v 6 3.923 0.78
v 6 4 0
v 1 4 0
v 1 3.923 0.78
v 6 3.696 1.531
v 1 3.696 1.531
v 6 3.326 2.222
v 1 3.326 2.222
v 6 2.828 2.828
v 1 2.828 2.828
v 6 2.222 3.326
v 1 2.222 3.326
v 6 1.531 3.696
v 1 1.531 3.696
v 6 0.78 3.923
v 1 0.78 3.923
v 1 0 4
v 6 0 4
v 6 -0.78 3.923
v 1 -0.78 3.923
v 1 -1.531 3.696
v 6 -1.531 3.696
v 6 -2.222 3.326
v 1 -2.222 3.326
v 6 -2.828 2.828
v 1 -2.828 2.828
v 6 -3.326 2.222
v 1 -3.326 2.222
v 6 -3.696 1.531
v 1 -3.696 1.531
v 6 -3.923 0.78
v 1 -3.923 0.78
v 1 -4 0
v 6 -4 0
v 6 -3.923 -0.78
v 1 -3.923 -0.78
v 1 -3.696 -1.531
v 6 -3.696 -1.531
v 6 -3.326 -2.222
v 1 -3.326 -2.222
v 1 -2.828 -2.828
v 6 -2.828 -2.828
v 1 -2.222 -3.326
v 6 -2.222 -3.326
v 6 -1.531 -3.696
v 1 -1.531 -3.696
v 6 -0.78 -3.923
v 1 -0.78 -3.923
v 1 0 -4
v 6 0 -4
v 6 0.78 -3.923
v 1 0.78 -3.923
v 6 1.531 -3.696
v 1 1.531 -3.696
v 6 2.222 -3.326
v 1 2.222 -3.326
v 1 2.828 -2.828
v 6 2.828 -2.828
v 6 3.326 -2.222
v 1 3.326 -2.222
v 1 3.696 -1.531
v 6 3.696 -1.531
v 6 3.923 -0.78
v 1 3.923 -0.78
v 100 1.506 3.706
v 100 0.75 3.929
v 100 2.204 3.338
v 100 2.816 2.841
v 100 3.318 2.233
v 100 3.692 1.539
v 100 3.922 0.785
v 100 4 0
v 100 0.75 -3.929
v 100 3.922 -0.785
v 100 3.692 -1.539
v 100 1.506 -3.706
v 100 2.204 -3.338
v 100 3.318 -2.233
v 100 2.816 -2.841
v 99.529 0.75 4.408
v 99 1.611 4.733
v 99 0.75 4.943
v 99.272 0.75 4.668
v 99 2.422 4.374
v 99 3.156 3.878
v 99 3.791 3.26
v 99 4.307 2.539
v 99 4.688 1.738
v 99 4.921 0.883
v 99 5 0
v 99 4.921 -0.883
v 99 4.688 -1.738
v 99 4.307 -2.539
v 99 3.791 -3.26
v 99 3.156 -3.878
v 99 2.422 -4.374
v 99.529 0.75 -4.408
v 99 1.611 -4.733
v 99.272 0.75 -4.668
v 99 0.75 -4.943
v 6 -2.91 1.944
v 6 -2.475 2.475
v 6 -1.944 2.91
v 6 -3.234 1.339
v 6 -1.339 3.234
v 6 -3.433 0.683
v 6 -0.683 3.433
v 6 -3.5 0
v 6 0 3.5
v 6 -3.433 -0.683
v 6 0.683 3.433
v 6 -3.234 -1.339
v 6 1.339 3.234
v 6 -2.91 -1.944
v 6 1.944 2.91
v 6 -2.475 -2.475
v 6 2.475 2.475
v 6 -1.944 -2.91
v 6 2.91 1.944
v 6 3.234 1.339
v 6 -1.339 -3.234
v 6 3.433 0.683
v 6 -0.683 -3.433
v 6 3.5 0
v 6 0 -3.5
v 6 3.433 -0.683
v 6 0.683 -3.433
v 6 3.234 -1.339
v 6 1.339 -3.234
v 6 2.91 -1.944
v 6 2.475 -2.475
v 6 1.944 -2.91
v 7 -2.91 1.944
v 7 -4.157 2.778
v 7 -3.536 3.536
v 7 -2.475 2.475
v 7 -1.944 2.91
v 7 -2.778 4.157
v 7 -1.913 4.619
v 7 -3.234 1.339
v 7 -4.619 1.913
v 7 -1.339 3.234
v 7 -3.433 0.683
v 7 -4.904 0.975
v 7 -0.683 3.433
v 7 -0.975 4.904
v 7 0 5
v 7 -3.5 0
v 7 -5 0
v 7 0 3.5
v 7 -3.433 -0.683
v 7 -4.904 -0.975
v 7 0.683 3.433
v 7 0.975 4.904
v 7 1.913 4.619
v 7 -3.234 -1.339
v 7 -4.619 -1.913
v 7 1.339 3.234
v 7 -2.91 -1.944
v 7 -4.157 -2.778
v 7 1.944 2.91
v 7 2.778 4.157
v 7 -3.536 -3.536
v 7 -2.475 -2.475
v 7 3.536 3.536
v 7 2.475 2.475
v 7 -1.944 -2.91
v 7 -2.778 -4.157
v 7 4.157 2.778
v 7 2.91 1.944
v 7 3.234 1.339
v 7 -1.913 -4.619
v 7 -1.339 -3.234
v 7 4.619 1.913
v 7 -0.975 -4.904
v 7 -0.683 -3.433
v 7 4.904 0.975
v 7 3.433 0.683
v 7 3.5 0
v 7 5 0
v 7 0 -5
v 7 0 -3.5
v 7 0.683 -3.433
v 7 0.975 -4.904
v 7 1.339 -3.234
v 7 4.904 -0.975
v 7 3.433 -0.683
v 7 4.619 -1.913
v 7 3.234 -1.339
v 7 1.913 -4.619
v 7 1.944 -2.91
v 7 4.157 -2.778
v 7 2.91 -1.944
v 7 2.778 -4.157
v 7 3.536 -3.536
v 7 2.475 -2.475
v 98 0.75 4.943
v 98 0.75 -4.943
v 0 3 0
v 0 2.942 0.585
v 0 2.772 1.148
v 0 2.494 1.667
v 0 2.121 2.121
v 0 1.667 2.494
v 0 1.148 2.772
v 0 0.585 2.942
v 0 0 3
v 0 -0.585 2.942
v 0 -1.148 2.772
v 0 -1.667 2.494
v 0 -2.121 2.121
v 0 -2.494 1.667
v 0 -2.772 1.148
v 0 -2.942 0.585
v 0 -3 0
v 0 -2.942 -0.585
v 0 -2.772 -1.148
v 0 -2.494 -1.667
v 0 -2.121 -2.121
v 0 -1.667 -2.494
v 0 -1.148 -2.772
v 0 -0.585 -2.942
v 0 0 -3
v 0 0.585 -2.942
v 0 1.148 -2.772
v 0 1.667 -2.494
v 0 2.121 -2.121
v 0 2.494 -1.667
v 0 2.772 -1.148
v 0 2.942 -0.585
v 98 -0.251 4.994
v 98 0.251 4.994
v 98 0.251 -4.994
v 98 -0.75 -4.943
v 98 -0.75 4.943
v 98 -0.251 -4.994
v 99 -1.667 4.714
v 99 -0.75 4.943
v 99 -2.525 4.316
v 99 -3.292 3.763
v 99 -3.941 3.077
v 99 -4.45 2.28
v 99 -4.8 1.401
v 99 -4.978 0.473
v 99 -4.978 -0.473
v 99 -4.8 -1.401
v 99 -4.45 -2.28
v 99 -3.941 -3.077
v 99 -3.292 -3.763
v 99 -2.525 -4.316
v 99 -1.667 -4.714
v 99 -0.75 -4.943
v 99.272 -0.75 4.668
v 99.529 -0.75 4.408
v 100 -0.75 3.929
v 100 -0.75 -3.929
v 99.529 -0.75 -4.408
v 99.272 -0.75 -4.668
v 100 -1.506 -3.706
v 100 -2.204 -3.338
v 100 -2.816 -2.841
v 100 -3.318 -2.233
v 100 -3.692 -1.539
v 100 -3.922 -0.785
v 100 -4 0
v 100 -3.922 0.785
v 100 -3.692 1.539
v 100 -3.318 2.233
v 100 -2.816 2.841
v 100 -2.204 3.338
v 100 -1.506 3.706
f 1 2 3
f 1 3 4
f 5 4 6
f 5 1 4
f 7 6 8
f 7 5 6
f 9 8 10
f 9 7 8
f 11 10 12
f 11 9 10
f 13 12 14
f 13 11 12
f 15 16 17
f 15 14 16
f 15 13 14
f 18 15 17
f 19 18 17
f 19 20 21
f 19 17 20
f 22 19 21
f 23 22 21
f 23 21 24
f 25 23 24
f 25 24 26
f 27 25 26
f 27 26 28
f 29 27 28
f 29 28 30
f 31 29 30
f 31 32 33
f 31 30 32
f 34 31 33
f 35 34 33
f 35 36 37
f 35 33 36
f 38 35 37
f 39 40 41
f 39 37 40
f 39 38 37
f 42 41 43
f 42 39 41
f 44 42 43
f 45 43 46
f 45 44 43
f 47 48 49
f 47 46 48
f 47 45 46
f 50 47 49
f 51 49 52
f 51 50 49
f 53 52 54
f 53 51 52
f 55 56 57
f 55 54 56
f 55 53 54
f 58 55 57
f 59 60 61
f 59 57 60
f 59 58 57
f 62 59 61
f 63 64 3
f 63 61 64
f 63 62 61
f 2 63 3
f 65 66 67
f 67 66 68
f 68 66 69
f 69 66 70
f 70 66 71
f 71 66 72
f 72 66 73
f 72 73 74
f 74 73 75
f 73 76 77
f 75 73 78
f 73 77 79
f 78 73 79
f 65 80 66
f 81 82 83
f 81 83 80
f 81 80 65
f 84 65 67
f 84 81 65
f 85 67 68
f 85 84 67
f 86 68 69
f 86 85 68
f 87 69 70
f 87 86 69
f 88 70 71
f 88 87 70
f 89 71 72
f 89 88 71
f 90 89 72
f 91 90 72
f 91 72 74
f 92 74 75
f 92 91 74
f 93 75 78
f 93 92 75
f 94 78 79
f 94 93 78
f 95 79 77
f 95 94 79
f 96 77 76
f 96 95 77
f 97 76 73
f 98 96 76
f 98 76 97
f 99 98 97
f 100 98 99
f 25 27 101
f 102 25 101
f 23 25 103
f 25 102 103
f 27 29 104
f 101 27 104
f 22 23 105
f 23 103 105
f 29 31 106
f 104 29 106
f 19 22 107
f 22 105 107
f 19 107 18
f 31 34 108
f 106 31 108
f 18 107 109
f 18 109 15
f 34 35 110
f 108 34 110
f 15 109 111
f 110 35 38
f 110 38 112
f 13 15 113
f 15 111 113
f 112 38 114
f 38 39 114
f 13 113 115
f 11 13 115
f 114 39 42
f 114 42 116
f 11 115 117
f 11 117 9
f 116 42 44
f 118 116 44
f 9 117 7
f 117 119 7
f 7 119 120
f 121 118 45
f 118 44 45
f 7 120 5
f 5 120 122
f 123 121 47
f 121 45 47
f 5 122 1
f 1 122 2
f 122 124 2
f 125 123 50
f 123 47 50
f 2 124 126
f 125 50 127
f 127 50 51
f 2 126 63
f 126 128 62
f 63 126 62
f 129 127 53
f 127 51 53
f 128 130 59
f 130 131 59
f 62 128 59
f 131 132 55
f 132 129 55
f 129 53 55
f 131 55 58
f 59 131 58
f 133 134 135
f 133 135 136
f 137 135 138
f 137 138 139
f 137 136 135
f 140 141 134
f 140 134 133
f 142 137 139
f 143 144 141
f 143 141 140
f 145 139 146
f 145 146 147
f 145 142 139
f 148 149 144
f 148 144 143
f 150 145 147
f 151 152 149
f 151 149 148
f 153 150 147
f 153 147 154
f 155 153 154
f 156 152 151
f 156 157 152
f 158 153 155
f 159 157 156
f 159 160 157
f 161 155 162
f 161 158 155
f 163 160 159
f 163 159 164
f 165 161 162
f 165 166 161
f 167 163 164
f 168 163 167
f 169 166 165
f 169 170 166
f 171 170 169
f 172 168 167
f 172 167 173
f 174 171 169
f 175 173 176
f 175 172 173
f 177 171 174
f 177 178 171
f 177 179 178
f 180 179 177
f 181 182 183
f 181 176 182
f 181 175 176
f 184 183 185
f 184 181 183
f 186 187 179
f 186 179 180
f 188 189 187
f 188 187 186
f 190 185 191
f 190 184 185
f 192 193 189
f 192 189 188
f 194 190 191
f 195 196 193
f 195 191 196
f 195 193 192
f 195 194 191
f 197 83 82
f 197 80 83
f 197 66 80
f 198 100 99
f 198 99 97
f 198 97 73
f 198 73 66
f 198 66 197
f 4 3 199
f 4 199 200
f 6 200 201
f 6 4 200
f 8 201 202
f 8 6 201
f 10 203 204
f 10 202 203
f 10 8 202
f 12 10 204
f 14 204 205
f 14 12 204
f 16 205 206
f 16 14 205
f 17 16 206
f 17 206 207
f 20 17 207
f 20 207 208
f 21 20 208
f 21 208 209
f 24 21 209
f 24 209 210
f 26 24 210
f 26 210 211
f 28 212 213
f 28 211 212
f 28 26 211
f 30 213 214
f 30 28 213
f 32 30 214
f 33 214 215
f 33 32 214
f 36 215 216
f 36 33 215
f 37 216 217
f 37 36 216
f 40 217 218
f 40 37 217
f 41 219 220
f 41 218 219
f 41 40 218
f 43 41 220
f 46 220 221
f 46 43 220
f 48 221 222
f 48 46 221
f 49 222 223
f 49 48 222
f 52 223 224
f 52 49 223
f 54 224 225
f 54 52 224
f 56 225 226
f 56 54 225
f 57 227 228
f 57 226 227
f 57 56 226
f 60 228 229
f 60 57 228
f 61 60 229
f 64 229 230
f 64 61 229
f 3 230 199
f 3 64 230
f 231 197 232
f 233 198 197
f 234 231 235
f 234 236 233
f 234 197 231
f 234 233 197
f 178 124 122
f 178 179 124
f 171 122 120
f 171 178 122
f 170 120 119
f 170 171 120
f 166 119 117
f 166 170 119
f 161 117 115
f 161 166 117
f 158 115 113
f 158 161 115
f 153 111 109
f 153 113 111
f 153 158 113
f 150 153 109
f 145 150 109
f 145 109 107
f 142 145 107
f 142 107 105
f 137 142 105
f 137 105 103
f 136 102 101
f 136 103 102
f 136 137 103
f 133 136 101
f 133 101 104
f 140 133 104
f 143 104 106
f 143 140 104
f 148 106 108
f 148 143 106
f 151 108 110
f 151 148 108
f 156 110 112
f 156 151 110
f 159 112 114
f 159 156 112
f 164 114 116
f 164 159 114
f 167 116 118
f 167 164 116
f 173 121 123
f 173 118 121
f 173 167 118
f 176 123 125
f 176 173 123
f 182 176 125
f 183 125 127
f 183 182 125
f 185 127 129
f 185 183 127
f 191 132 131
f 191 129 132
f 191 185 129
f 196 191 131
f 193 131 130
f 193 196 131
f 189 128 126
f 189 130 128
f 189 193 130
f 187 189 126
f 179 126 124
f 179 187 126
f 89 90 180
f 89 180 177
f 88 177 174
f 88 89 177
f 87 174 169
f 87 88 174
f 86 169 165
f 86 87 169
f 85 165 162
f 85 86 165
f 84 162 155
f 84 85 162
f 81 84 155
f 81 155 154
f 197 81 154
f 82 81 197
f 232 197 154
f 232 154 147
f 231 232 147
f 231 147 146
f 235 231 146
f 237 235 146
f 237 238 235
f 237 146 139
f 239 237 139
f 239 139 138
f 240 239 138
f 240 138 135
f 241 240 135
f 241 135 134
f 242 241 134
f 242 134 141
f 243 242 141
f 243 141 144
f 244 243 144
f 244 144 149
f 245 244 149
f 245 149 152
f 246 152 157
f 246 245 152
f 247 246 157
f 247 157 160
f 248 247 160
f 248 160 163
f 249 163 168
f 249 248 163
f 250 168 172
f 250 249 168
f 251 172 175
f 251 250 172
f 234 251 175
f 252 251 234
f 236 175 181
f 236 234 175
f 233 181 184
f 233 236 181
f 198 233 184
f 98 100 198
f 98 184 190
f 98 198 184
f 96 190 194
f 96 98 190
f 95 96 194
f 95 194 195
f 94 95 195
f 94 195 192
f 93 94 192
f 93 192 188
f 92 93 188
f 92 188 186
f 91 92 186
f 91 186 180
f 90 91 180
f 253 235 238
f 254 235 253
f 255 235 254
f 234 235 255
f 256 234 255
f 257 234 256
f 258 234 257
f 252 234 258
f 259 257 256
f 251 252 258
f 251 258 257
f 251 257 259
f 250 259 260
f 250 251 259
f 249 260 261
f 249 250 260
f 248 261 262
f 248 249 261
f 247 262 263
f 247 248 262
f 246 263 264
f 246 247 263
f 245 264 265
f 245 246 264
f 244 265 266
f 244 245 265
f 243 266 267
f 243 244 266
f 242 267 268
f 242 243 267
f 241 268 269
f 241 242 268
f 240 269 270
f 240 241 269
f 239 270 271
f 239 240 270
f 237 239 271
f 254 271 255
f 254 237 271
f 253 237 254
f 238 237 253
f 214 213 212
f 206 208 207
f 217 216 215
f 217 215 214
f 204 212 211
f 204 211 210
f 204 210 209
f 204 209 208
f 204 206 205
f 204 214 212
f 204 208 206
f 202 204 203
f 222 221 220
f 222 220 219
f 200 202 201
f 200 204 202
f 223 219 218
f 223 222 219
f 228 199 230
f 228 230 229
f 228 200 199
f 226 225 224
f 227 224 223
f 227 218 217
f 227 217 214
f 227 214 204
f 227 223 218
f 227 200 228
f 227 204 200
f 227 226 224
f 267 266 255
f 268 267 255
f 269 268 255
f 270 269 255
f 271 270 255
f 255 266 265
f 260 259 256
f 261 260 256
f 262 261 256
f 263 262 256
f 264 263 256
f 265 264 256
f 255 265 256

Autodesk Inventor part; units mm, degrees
ref_plane "YZ Plane" through (0, 0, 0) normal (1, 0, 0) x (0, 1, 0)
ref_plane "XZ Plane" through (0, 0, 0) normal (0, 1, 0) x (-1, 0, 0)
ref_plane "XY Plane" through (0, 0, 0) normal (0, 0, 1) x (1, 0, 0)
sketch "Sketch1" plane through (0, 0, 0) normal (0, 0, 1) x (1, 0, 0)
  line L0 (0, 0) -> (0, 4)
  line L1 (0, 4) -> (6, 4)
  line L2 (7, 3.5) -> (7, 5)
  line L3 (7, 5) -> (100, 5)
  line L4 (100, 5) -> (100, 0)
  line L5 (100, 0) -> (0, 0)
  line L6 (6, 4) -> (6, 3.5)
  line L7 (6, 3.5) -> (7, 3.5)
  dimension "d0" = 8
  dimension "d1" = 10
  dimension "d3" = 100
  dimension "d17" = 7
  dimension "d18" = 1
  dimension "d19" = 7
revolve "Revolution1" add sketch "Sketch1" angle 360 about axis through (100, 0, 0) along (-1, 0, 0)
thread "Thread1" size "M8x1.25" class "6g" standard "ISO Metric profile" full length
chamfer "Chamfer1" distance 1 angle 45 1 edges at (0, -4, 0)
sketch "Sketch2" plane through (0, 0, 0) normal (0, 0, 1) x (1, 0, 0)
  line L0 (100, 0.75) -> (98, 0.75)
  line L1 (98, 0.75) -> (98, -0.75)
  line L2 (98, -0.75) -> (100, -0.75)
  line L3 (100, -0.75) -> (100, 0.75)
  line L4 (100, -5) -> (100, 5) construction
  point P0 (0, 0)
  point P1 (98, 0)
  dimension "d10" = 1.5
  dimension "d11" = 2
extrude "Extrusion1" cut sketch "Sketch2" along normal through all both and the other way through all
chamfer "Chamfer2" distance 1 angle 45 3 edges at (100, -5, 0) (100, 3.7914, -3.2596) (100, 3.7914, 3.2596)
properties part number "Shaft" material "Steel"
